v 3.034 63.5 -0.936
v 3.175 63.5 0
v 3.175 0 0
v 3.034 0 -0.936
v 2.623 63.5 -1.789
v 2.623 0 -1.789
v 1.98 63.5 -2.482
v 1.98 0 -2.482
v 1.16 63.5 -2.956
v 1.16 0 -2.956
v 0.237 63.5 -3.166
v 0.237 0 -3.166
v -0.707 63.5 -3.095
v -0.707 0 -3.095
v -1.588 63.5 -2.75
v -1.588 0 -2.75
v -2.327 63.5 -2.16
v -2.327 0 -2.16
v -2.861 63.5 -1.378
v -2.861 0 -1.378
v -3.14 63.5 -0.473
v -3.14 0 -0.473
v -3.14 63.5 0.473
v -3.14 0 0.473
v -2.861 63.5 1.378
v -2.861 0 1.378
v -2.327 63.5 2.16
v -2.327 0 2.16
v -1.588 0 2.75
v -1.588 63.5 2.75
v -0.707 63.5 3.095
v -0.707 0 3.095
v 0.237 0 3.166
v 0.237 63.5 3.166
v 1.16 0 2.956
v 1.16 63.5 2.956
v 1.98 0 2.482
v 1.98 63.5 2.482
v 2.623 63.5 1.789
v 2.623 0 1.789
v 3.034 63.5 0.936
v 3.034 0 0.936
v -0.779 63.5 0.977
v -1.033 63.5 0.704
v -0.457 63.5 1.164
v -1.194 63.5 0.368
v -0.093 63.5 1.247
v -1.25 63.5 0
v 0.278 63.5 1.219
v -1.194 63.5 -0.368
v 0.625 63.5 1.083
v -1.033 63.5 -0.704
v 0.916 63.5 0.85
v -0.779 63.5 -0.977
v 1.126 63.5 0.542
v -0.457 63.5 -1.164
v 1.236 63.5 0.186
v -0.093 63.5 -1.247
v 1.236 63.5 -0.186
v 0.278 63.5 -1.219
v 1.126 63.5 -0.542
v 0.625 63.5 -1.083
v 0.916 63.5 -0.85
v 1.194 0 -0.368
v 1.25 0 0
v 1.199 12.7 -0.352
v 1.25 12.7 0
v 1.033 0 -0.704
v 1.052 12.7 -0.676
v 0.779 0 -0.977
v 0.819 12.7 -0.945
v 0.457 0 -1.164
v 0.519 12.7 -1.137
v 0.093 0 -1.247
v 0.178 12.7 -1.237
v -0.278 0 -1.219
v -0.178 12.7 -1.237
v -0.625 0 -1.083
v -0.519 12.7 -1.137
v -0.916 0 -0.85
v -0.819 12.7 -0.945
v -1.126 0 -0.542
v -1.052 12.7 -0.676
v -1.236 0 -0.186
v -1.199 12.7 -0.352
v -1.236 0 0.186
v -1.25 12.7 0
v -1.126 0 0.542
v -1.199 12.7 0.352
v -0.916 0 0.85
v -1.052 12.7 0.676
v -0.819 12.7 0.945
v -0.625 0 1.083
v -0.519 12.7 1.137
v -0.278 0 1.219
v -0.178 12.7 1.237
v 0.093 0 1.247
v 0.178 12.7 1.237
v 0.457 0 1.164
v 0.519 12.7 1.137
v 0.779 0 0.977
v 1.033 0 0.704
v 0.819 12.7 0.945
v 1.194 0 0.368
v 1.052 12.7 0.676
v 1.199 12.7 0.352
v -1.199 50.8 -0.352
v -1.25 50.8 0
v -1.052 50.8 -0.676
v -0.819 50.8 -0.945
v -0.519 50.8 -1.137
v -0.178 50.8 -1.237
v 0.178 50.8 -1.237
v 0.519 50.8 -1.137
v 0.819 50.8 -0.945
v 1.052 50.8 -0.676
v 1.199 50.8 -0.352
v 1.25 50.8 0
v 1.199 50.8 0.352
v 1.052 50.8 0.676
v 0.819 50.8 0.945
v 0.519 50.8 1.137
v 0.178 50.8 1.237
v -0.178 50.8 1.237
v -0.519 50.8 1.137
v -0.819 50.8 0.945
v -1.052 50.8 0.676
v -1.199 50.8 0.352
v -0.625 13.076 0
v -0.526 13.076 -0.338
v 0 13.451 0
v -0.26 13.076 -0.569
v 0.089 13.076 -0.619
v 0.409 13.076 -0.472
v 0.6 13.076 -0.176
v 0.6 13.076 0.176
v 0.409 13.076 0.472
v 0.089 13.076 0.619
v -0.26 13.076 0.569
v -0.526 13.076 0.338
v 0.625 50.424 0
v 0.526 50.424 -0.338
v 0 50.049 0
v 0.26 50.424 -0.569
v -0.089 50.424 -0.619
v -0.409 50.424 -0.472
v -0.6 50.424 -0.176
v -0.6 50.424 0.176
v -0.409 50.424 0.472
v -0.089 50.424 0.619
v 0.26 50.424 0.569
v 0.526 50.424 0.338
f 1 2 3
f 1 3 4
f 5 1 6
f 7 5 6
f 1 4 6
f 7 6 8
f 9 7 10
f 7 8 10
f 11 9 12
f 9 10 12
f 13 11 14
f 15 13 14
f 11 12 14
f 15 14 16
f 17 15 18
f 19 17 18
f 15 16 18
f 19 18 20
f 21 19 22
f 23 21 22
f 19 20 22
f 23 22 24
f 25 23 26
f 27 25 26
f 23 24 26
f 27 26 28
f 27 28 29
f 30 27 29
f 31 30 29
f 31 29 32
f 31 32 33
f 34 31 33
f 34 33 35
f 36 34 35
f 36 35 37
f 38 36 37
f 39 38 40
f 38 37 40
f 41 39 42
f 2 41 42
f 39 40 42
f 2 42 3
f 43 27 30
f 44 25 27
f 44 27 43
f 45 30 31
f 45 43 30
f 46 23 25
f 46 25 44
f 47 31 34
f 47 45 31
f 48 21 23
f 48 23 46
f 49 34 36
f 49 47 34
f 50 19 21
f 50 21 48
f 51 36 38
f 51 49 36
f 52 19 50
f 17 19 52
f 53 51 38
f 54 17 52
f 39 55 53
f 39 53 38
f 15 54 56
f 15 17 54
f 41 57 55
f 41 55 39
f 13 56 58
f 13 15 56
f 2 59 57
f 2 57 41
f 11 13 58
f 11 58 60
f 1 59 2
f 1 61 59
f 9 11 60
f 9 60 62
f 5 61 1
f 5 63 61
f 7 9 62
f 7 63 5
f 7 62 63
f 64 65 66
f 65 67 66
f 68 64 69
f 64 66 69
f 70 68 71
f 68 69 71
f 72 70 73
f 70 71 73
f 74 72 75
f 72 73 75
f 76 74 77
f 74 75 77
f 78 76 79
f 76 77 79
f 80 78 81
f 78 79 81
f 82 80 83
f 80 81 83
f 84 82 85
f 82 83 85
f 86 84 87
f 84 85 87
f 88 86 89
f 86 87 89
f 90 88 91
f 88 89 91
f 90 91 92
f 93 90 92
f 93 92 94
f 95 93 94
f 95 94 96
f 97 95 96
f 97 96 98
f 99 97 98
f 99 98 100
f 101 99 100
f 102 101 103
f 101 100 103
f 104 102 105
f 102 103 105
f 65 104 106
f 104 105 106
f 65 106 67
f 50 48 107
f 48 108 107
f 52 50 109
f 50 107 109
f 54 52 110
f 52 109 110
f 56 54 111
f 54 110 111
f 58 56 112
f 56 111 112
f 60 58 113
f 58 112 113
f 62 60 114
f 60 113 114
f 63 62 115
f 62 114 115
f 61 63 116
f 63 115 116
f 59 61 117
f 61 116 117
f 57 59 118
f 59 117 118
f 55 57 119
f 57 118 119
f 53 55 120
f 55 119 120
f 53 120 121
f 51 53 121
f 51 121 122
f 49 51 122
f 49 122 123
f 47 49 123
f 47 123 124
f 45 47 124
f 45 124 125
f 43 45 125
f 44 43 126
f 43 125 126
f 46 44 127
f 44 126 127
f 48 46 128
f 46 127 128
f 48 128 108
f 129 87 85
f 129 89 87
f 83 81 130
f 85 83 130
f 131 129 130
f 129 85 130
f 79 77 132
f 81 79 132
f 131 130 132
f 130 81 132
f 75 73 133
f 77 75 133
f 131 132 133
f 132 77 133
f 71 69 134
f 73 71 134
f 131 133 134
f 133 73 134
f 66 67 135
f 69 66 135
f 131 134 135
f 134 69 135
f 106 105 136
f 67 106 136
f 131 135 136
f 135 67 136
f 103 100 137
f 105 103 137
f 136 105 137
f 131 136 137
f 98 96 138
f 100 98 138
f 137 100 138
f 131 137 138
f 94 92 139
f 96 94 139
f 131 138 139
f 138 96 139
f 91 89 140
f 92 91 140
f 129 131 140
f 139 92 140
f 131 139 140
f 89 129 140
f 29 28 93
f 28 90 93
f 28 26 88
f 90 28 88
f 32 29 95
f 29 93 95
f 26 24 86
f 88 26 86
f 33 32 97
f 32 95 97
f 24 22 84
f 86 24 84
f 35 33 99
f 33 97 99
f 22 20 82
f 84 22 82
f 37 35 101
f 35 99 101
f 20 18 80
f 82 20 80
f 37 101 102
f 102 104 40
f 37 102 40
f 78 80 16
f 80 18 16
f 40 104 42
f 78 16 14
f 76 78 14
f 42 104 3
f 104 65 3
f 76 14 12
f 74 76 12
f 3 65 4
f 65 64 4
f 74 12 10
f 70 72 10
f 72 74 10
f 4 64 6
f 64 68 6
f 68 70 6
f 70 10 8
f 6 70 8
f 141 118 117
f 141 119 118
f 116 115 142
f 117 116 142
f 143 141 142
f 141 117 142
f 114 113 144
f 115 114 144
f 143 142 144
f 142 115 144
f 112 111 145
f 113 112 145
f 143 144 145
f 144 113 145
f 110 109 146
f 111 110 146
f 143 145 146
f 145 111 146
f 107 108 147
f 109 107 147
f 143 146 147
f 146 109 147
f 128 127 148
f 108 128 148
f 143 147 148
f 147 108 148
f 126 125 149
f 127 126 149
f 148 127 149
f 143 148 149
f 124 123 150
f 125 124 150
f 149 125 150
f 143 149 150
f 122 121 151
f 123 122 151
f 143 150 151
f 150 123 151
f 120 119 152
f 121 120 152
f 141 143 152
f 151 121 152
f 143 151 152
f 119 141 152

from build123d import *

# Parameters (mm, degrees)
SKETCH1_R                 = 3.175
BOSS_EXTRUDE1_DEPTH       = 63.5
M3X0_5_TAPPED_HOLE1_D     = 2.5
M3X0_5_TAPPED_HOLE1_DEPTH = 12.7
M3X0_5_TAPPED_HOLE1_TIP   = 0.751075774
M3X0_5_TAPPED_HOLE2_D     = 2.5
M3X0_5_TAPPED_HOLE2_DEPTH = 12.7
M3X0_5_TAPPED_HOLE2_TIP   = 0.751075774


with BuildPart() as part:
    # Sketch1 → Boss-Extrude1 (new body)
    with BuildSketch(Plane(origin=(0, 0, 0), x_dir=(1, 0, 0), z_dir=(0, 1, 0))):
        Circle(SKETCH1_R)
    extrude(amount=BOSS_EXTRUDE1_DEPTH)

    # M3x0.5 Tapped Hole1
    with Locations(Plane(origin=(0, 63.5, 0), x_dir=(1, 0, 0), z_dir=(0, 1, 0))):
        with Locations((0, 0)):
            Hole(M3X0_5_TAPPED_HOLE1_D / 2, depth=M3X0_5_TAPPED_HOLE1_DEPTH)
            with Locations((0, 0, -(M3X0_5_TAPPED_HOLE1_DEPTH + M3X0_5_TAPPED_HOLE1_TIP / 2))):  # 118° drill point
                Cone(0, M3X0_5_TAPPED_HOLE1_D / 2, M3X0_5_TAPPED_HOLE1_TIP, mode=Mode.SUBTRACT)

    # M3x0.5 Tapped Hole2
    with Locations(Plane(origin=(0, 0, 0), x_dir=(-1, 0, 0), z_dir=(0, -1, 0))):
        with Locations((0, 0)):
            Hole(M3X0_5_TAPPED_HOLE2_D / 2, depth=M3X0_5_TAPPED_HOLE2_DEPTH)
            with Locations((0, 0, -(M3X0_5_TAPPED_HOLE2_DEPTH + M3X0_5_TAPPED_HOLE2_TIP / 2))):  # 118° drill point
                Cone(0, M3X0_5_TAPPED_HOLE2_D / 2, M3X0_5_TAPPED_HOLE2_TIP, mode=Mode.SUBTRACT)


solid = part.part
